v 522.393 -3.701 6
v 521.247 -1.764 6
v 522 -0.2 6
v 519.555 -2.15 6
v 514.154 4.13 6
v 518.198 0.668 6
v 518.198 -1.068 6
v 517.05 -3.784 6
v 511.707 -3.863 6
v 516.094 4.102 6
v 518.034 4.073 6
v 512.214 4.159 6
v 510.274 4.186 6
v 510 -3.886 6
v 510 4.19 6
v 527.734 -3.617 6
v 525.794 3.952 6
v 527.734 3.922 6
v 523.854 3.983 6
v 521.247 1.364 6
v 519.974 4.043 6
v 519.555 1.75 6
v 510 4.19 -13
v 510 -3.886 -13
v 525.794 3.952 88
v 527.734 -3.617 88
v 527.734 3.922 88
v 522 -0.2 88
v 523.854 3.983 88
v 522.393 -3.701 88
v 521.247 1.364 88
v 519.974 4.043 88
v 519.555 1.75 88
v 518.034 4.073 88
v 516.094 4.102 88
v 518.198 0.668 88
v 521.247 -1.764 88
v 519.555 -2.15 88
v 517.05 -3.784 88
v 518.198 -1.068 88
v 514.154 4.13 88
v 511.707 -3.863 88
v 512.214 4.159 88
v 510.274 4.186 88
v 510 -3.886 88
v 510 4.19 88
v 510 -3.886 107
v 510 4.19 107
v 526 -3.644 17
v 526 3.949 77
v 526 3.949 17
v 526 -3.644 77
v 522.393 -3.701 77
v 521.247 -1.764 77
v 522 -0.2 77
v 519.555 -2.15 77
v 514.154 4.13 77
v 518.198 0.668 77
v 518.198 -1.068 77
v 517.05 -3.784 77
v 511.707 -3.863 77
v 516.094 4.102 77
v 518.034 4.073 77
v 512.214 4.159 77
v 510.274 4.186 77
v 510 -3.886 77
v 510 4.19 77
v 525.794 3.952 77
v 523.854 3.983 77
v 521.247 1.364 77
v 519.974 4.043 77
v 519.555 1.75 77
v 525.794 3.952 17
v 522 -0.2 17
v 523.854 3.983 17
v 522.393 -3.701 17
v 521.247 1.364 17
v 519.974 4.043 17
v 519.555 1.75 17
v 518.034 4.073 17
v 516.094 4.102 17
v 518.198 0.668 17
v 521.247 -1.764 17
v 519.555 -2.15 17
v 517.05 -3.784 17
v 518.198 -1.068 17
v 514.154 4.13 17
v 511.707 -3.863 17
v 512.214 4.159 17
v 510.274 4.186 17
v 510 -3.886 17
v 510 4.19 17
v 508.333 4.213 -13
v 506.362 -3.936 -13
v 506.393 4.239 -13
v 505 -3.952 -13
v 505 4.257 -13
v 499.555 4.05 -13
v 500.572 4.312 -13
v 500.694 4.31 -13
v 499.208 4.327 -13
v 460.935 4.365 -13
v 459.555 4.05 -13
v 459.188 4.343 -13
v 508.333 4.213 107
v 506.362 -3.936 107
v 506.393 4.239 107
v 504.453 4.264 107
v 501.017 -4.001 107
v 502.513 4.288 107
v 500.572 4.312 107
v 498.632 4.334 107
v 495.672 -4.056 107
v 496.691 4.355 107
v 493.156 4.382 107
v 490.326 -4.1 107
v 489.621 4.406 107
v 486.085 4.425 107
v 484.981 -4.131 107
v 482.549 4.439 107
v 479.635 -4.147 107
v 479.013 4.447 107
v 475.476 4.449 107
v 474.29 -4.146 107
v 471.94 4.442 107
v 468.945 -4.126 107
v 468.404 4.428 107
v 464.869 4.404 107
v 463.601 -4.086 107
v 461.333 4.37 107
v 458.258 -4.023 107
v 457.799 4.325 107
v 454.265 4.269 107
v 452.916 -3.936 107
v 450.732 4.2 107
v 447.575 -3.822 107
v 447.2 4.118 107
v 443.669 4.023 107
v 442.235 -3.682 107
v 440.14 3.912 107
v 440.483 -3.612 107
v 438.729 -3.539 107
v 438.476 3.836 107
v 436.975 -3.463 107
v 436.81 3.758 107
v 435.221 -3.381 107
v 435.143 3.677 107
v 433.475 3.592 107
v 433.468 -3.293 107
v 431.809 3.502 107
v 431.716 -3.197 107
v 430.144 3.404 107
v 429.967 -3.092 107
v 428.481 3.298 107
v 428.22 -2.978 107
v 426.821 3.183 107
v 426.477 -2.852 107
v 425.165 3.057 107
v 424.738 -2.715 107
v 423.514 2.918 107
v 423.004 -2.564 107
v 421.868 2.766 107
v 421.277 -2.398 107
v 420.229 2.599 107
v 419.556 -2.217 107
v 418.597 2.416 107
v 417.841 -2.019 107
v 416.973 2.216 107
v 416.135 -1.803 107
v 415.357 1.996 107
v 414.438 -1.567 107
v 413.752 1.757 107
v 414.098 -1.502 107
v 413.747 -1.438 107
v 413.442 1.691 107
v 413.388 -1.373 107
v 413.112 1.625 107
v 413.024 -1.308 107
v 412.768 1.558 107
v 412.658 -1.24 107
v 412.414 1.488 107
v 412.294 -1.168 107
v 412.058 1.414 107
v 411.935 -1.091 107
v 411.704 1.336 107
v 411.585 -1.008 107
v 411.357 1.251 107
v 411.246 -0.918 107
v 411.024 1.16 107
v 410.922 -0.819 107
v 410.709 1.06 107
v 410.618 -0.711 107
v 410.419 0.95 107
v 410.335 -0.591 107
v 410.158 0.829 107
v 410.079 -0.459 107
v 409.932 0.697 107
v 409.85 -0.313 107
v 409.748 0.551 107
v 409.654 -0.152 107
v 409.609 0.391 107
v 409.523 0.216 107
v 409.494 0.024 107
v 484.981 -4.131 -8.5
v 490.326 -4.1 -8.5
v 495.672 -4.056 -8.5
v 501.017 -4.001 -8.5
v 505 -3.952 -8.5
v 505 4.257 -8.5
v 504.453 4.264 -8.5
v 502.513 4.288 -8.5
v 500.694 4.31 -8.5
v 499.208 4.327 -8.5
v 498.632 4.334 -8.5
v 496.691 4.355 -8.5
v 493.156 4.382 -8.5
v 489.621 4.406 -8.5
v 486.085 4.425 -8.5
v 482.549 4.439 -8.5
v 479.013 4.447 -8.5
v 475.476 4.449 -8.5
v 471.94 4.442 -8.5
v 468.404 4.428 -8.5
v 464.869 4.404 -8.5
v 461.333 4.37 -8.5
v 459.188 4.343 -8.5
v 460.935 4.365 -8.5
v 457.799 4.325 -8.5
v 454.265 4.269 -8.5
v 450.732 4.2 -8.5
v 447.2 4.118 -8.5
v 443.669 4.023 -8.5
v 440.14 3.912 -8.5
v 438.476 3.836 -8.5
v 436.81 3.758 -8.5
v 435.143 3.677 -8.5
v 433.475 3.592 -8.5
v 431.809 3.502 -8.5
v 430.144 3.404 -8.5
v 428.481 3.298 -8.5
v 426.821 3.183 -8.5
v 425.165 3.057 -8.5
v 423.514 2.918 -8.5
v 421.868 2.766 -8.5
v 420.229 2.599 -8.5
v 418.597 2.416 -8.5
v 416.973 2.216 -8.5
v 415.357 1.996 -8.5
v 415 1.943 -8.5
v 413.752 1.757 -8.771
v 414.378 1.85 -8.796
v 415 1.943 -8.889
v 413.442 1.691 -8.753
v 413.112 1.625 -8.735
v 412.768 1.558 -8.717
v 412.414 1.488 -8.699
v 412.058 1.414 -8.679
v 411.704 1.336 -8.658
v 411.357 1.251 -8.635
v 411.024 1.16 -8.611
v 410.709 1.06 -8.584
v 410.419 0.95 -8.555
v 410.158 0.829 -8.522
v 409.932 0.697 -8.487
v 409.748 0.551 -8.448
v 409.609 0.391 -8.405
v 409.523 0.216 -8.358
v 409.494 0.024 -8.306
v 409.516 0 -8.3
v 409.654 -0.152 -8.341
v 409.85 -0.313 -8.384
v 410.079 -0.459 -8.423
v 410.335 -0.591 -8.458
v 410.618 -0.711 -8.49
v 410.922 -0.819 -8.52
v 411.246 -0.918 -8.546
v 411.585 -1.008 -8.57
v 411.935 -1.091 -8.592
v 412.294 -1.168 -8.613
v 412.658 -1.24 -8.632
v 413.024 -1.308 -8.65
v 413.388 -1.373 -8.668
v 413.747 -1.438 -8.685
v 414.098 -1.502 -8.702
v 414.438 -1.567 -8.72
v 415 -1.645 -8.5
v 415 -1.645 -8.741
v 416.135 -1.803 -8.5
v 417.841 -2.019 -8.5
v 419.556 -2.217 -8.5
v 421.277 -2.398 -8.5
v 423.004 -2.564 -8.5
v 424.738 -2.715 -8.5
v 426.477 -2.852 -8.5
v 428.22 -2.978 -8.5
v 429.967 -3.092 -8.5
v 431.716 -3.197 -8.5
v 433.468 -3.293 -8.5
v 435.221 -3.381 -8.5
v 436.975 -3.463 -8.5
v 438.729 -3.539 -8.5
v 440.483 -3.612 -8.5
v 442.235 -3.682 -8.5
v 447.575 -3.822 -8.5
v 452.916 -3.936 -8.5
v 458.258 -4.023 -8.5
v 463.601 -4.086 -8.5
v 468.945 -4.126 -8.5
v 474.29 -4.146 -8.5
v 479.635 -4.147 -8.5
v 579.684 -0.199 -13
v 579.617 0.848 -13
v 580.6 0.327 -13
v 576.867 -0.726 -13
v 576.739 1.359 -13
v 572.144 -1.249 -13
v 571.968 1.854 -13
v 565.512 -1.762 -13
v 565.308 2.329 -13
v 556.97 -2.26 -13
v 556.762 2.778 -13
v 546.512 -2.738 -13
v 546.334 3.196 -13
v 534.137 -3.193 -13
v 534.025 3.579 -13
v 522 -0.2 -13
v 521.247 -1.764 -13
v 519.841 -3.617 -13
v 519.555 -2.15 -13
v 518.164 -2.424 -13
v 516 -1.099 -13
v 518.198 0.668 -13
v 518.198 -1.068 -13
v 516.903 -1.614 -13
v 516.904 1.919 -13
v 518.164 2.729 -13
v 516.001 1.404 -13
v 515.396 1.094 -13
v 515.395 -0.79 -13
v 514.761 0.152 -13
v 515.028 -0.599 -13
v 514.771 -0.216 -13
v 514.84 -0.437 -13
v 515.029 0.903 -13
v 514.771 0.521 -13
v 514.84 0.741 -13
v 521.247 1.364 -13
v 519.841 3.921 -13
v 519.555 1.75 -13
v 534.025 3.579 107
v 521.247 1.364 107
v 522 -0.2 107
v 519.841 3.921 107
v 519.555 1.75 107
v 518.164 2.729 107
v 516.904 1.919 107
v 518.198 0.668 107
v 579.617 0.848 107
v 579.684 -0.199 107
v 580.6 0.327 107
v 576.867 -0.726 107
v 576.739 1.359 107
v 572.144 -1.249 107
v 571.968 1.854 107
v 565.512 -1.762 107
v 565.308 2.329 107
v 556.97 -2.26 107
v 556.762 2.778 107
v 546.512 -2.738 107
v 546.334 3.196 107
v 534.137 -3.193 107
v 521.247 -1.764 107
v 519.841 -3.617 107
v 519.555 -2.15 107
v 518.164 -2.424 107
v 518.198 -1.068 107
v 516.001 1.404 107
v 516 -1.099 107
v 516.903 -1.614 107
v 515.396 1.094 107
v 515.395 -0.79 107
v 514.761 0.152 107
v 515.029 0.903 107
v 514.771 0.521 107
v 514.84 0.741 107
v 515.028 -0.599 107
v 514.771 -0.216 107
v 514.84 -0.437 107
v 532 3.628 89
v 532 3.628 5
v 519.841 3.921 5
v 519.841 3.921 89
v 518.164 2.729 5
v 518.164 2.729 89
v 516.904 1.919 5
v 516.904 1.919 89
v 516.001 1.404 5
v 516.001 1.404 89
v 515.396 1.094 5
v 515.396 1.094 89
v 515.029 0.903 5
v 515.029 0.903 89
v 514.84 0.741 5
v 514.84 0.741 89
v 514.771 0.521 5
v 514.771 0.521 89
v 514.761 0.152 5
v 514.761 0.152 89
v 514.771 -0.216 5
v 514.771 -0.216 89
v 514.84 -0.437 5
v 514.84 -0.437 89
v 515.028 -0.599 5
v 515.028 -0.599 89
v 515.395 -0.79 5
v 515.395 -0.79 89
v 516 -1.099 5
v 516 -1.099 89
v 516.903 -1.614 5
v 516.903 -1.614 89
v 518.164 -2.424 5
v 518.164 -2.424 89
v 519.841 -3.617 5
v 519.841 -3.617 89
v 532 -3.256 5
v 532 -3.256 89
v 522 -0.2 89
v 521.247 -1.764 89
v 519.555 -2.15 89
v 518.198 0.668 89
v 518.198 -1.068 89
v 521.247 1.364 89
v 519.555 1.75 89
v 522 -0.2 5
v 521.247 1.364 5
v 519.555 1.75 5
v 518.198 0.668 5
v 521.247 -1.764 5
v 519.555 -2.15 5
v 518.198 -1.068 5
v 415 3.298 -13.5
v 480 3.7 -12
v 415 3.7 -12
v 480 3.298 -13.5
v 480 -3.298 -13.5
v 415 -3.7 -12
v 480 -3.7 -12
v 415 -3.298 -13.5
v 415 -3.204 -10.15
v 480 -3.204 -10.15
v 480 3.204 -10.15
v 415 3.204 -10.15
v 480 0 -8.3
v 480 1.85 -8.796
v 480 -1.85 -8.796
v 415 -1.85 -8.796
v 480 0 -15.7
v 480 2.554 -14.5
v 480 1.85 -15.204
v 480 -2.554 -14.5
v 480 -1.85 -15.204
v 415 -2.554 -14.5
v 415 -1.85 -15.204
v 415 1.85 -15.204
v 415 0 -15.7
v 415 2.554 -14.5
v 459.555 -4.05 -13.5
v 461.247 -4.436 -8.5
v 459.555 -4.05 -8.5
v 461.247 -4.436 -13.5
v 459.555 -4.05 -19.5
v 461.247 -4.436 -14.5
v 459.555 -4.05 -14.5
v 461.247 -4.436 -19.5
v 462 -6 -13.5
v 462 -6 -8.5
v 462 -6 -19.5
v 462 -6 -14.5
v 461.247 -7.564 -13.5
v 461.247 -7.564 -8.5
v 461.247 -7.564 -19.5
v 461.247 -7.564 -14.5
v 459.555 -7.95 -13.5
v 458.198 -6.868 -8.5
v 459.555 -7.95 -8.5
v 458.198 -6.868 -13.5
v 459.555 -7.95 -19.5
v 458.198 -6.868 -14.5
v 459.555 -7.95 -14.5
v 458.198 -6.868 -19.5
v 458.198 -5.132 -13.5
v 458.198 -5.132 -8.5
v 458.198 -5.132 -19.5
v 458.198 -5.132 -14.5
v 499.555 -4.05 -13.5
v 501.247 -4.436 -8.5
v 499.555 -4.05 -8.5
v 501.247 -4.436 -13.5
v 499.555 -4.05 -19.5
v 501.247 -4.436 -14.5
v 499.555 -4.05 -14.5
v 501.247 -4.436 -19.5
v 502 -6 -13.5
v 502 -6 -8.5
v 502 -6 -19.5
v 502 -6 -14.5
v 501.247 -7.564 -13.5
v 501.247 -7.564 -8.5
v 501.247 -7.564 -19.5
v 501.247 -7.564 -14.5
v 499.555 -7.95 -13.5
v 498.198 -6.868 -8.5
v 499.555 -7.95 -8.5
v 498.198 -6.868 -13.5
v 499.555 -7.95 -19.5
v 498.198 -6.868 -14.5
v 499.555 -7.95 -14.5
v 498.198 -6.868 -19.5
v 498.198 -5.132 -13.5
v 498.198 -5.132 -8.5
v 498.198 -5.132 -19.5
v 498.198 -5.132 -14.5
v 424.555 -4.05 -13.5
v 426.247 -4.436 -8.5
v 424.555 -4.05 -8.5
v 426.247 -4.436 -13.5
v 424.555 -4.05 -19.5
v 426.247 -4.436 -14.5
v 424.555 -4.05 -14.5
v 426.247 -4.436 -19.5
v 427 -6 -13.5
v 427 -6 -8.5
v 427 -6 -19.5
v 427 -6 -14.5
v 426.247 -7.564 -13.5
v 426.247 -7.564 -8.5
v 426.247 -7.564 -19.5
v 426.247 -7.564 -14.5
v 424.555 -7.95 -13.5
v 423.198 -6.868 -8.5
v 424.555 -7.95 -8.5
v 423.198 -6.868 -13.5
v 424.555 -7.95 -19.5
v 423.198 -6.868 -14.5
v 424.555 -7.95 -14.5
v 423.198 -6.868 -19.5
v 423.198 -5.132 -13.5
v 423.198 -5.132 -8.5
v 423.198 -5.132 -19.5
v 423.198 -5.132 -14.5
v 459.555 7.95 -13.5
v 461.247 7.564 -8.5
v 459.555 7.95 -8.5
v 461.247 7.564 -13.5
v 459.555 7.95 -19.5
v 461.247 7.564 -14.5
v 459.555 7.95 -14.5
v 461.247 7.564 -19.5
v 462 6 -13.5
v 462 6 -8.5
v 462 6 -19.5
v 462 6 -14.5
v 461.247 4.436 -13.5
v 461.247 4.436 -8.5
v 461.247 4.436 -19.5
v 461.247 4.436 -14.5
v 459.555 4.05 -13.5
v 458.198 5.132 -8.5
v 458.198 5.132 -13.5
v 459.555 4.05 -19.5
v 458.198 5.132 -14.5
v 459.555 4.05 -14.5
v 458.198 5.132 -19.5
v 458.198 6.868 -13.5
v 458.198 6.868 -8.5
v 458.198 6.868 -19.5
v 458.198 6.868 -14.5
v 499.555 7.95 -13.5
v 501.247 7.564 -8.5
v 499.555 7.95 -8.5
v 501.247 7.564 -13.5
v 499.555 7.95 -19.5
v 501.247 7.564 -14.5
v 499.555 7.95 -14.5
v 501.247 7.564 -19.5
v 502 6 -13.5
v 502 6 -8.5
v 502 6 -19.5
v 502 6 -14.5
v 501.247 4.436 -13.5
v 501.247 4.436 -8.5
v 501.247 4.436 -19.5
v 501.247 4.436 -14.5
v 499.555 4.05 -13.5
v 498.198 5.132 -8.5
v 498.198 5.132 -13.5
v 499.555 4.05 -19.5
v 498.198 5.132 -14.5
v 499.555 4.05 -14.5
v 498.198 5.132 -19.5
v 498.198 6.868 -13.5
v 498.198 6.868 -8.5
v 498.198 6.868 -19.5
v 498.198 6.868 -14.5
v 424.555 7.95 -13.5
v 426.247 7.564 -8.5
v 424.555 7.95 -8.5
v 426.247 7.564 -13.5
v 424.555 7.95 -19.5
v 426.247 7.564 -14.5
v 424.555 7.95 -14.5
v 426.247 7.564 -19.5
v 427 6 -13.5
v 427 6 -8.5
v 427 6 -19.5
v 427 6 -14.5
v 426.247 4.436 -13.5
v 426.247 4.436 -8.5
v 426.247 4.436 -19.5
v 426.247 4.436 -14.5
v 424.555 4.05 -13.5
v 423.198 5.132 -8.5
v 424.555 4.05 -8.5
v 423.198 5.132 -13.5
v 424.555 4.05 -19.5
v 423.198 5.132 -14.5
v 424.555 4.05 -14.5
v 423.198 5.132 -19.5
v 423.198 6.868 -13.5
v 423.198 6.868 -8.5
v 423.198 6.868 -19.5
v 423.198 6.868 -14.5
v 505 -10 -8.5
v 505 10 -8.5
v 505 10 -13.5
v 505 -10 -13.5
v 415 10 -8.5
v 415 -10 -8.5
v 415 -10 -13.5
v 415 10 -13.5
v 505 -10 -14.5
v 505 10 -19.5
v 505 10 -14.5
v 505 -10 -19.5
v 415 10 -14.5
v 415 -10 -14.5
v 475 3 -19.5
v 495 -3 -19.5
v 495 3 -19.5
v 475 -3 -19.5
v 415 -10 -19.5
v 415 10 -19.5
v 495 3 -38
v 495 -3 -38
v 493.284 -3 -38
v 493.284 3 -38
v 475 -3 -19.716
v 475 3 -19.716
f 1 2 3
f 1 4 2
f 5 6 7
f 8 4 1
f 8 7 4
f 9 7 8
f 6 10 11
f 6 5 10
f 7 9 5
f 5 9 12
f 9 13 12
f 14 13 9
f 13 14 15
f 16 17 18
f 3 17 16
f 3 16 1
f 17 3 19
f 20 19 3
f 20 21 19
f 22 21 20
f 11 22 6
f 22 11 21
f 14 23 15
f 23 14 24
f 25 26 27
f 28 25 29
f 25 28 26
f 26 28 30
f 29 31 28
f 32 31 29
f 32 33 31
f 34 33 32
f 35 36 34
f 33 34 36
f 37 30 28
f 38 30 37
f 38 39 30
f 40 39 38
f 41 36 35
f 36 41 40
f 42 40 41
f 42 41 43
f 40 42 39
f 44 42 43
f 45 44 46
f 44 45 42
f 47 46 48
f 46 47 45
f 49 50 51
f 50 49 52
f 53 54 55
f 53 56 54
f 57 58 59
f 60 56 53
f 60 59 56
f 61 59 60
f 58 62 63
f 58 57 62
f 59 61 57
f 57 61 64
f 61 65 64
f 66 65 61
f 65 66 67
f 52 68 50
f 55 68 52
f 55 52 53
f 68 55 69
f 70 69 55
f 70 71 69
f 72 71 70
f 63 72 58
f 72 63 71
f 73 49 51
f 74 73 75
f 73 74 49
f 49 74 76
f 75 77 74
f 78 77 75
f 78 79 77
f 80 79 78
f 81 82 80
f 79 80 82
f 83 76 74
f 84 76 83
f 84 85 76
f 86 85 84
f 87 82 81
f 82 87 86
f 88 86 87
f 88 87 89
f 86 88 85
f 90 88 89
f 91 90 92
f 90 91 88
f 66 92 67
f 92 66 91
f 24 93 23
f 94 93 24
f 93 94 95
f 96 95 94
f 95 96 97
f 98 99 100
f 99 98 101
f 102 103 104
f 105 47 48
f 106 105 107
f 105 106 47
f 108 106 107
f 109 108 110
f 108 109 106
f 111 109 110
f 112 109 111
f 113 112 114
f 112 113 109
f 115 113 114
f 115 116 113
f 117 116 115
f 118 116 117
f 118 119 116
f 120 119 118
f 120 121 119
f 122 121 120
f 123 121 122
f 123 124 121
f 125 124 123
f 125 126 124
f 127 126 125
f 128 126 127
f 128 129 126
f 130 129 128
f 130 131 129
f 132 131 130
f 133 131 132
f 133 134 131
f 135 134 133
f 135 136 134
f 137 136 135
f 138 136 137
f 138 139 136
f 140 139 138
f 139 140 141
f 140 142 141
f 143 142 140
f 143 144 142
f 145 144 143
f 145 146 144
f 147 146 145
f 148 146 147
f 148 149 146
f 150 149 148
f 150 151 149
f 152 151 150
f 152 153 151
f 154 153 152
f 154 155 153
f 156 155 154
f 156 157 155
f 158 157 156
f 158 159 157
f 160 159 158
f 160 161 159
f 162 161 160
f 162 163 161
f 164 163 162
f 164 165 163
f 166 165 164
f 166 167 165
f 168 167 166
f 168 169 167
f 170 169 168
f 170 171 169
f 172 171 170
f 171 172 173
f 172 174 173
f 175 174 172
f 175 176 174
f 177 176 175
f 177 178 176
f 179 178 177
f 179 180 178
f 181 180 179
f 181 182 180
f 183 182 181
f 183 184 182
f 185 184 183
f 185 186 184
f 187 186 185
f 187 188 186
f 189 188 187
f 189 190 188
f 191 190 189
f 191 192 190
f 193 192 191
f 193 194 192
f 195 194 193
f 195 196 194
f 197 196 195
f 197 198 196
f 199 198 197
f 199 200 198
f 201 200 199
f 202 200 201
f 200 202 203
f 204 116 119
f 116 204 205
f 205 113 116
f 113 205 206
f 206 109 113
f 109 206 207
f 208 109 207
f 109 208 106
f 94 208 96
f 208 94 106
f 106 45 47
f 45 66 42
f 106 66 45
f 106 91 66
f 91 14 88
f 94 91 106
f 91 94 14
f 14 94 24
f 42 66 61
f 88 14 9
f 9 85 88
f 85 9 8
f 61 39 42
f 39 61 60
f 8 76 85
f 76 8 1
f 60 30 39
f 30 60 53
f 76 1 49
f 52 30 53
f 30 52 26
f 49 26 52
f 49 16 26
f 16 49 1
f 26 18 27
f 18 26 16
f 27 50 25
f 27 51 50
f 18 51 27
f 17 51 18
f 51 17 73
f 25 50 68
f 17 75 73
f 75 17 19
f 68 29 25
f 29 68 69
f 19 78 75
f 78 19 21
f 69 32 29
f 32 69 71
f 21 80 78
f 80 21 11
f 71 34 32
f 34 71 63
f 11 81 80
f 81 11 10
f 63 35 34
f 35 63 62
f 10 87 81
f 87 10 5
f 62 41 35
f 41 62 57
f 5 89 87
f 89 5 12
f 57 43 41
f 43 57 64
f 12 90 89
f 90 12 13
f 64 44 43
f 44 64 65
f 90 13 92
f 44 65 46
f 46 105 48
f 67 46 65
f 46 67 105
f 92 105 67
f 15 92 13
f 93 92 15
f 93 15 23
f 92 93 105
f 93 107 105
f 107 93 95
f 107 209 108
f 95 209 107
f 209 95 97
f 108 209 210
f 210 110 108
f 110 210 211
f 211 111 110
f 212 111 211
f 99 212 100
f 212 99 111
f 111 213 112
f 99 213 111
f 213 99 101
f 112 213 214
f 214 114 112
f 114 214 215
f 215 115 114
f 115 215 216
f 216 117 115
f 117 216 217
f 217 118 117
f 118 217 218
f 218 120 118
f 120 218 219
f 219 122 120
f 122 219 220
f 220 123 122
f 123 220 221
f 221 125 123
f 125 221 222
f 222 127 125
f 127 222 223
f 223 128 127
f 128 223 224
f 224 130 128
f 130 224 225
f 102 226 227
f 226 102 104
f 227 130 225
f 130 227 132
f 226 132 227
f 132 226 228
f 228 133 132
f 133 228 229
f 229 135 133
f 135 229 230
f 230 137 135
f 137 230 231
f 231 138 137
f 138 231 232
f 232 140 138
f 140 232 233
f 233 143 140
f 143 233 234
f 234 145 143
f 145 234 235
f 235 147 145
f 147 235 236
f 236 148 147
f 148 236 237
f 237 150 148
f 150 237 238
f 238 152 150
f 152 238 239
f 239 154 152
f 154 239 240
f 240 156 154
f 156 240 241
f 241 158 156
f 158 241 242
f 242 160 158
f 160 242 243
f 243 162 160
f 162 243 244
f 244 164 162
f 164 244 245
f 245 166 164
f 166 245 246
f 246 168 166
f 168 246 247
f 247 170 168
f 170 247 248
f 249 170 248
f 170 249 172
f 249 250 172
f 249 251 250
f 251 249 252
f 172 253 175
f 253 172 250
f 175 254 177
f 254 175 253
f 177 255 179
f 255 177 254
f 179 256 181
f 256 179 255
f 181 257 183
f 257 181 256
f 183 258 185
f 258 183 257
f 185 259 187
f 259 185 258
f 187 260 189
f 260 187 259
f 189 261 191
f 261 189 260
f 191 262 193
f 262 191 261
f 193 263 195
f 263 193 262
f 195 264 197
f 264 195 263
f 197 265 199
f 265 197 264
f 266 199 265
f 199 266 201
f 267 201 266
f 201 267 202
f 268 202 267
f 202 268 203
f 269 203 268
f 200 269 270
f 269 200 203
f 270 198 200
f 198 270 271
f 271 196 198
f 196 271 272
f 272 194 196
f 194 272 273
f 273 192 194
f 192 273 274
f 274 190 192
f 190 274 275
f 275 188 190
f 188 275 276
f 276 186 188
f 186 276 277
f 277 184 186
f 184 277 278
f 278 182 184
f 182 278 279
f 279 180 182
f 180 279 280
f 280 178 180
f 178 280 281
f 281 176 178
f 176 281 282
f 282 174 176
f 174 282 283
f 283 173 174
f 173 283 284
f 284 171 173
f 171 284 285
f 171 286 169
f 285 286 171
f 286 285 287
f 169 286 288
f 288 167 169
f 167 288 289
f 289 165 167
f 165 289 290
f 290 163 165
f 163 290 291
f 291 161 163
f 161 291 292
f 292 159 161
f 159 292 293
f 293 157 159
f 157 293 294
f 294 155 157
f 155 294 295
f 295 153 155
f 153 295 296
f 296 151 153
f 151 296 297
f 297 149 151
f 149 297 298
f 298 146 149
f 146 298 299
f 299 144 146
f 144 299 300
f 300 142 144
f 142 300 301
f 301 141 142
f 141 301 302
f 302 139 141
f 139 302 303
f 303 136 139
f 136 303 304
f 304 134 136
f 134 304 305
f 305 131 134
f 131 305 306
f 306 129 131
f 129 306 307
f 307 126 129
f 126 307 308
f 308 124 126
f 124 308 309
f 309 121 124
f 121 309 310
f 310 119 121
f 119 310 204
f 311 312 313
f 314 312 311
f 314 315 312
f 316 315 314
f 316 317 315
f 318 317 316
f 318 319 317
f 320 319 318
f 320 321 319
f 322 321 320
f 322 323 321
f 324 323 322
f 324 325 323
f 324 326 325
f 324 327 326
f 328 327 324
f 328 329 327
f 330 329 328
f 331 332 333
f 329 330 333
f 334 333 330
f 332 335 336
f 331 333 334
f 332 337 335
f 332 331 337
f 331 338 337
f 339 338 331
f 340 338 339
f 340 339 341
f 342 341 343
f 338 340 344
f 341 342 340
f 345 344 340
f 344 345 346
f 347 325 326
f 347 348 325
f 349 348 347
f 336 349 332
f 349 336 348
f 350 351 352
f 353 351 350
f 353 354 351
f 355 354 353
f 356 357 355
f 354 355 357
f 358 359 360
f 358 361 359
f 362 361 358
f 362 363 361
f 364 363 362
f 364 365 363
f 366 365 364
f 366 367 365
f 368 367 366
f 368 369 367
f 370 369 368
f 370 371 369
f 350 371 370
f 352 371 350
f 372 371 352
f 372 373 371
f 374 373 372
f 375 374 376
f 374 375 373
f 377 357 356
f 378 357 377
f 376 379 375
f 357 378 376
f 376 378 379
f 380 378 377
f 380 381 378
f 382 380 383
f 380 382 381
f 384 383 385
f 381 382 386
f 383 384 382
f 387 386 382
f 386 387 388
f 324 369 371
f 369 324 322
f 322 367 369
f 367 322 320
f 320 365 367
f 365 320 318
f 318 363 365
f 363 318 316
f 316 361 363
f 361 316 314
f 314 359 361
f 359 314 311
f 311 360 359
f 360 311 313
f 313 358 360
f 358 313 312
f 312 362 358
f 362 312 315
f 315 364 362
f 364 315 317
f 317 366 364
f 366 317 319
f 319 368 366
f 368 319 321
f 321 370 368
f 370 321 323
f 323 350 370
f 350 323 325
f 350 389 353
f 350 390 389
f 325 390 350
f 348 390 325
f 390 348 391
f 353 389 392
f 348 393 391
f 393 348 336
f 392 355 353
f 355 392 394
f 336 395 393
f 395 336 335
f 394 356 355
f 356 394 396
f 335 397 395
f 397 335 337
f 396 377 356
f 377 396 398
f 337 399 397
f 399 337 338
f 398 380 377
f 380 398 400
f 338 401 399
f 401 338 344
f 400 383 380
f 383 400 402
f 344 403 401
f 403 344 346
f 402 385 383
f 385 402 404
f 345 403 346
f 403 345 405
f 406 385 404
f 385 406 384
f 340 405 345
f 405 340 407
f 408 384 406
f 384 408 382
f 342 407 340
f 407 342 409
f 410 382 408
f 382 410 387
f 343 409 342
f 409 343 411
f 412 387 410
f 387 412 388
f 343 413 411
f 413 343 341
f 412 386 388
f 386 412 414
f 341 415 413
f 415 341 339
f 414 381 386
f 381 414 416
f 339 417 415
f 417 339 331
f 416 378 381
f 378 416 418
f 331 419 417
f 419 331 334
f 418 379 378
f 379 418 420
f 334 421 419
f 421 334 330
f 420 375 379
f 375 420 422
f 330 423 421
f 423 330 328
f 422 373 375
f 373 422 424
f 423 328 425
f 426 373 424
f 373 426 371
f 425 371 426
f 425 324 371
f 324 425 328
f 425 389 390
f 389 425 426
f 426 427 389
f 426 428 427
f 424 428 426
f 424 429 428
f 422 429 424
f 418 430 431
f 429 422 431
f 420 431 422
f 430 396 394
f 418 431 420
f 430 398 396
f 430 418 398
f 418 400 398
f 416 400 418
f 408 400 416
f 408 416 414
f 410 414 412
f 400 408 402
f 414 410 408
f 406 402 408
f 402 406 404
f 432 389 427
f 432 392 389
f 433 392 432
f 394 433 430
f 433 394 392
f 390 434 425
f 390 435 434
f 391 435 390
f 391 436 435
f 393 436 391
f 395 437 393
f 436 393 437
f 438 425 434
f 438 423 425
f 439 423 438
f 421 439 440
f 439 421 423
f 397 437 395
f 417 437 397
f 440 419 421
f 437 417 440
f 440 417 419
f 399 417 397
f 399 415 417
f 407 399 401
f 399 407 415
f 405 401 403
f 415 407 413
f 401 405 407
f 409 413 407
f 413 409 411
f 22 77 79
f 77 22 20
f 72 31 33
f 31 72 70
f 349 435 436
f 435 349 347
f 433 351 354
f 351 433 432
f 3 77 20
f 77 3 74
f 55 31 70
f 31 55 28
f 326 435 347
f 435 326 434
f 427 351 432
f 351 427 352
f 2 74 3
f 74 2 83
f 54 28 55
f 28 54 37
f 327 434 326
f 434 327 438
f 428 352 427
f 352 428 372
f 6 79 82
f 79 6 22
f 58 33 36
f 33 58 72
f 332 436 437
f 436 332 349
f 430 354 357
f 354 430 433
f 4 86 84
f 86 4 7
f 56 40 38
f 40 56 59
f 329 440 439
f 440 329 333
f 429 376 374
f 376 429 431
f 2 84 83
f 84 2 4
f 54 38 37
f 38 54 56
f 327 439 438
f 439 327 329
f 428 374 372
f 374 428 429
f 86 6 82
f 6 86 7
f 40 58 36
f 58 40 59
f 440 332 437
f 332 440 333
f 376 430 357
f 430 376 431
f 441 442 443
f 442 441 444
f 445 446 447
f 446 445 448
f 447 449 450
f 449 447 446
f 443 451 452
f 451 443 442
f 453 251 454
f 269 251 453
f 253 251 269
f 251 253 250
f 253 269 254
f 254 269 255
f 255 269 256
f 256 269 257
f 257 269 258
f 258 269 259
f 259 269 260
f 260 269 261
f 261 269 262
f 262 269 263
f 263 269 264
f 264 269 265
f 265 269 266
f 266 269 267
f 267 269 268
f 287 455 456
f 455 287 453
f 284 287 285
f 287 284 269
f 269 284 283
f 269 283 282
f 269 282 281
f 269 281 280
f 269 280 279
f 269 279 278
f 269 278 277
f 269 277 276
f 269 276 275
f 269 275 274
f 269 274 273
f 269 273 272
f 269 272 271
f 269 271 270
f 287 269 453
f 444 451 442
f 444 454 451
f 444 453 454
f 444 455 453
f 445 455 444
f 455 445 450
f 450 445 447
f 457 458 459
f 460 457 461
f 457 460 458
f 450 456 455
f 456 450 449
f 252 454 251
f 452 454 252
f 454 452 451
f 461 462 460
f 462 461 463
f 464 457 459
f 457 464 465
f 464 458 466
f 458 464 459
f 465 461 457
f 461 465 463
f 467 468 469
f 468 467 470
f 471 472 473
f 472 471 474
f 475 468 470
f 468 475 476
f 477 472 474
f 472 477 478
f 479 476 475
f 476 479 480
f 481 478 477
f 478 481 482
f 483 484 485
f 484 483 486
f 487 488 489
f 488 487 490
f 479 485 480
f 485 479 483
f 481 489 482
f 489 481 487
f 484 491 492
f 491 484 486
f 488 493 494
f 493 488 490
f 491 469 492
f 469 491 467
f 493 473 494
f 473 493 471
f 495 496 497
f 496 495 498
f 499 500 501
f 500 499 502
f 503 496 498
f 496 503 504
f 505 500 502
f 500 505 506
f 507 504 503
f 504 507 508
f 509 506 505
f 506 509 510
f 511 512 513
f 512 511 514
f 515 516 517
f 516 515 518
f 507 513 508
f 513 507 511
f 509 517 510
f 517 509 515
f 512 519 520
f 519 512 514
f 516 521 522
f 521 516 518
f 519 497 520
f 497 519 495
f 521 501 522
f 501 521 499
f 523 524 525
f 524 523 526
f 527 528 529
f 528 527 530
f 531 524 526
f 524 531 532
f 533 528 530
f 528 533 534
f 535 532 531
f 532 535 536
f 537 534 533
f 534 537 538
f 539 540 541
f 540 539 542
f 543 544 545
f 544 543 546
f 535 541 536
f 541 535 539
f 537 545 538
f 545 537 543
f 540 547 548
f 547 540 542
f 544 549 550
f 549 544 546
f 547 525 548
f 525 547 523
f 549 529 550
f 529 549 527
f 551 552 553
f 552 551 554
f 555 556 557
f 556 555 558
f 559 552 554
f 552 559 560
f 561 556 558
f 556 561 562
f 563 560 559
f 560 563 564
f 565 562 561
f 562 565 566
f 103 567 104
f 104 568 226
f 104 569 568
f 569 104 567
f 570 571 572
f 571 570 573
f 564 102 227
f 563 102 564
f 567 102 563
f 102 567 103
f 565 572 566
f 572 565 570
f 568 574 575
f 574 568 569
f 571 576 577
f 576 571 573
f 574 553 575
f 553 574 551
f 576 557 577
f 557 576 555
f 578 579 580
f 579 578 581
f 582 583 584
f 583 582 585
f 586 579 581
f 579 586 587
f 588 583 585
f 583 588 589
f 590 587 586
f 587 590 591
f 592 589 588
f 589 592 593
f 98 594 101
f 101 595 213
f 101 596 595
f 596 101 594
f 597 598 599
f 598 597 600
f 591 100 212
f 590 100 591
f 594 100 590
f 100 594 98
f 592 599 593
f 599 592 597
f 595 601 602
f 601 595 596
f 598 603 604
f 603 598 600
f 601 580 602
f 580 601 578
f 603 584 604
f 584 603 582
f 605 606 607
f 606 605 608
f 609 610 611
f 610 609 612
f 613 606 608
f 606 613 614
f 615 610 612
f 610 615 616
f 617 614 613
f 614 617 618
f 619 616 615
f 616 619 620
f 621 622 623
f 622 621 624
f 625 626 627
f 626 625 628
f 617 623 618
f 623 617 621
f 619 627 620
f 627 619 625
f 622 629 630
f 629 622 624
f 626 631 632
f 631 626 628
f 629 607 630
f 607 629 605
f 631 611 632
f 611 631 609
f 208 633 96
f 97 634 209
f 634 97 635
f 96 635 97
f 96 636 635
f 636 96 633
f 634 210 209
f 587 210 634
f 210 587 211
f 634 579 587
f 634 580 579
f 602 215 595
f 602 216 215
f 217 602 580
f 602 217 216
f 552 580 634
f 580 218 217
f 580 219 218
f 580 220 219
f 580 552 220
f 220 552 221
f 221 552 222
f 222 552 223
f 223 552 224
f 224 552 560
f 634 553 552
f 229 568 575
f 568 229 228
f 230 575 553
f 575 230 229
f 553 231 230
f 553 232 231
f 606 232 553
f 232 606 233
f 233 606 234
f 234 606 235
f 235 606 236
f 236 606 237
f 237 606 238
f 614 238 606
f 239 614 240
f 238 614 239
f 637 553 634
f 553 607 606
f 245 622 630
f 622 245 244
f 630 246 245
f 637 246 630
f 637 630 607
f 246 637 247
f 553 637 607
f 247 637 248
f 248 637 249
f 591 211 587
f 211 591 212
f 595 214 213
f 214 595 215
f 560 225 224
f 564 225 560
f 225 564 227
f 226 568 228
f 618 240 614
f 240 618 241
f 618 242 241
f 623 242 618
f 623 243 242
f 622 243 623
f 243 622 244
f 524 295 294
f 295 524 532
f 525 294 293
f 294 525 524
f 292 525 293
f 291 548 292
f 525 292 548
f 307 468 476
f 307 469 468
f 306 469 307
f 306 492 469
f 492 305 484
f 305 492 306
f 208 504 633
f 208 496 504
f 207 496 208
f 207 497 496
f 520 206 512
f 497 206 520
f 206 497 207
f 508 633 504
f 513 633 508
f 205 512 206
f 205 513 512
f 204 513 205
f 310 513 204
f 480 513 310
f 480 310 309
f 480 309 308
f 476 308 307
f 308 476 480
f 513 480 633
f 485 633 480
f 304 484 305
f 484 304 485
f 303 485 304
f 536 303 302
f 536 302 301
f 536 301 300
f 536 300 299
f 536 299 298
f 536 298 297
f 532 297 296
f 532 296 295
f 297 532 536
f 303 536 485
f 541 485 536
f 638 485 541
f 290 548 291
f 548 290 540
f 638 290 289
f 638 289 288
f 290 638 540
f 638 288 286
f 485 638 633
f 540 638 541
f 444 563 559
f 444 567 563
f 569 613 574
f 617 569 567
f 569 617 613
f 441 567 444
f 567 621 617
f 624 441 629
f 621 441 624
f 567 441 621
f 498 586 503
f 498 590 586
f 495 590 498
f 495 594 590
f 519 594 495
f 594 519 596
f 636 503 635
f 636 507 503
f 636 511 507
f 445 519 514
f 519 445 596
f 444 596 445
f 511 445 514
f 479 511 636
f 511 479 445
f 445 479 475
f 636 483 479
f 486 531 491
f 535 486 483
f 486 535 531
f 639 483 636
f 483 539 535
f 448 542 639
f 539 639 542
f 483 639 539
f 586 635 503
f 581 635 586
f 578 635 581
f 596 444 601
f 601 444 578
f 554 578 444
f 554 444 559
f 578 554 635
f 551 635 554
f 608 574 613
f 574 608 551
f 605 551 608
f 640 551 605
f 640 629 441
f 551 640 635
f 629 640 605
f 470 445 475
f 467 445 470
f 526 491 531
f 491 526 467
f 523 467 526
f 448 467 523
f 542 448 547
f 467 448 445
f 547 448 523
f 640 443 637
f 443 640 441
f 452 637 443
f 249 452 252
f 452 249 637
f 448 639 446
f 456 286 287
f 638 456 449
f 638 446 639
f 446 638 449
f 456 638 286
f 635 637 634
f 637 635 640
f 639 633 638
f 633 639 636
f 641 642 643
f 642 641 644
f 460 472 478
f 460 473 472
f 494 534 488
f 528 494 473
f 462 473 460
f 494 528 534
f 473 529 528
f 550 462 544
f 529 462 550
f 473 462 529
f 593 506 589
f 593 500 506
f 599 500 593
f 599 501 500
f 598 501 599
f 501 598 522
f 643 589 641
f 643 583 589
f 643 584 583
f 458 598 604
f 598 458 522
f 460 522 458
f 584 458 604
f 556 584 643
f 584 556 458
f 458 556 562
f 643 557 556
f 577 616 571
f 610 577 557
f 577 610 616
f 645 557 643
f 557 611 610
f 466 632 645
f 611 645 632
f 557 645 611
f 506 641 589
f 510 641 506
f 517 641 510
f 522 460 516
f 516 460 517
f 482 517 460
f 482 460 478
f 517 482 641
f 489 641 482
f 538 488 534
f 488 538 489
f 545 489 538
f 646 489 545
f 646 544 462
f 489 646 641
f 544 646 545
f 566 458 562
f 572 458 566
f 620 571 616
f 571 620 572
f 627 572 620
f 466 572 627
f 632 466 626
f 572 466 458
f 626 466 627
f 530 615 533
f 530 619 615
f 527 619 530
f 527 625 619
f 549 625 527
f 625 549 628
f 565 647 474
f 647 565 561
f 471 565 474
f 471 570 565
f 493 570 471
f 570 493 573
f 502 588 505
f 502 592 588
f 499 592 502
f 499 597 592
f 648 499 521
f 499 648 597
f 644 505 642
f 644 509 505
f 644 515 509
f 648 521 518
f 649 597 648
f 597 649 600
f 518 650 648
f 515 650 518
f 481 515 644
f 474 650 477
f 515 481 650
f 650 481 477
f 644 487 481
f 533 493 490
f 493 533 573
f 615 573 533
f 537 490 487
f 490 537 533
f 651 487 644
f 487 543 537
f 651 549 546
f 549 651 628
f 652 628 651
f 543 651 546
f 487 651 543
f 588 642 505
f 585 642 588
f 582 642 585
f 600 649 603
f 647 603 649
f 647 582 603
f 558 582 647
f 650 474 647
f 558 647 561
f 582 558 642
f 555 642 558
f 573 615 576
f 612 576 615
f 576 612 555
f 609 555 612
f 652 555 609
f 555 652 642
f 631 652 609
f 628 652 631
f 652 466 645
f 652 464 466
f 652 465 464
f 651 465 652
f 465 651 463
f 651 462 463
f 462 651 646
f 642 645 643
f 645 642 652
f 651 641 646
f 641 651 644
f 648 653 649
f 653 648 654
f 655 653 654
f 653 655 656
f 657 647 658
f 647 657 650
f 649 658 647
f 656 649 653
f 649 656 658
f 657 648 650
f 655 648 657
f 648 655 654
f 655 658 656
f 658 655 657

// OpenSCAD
module tail_front(){
  difference(){
  scale([0.6,0.3,0.6])
  linear_extrude(file = "tail/front.dxf",height = 200, convexity = 10);

  union(){
    translate([110,60,-1])
    cube([36,70,20]);
    translate([110,60,101])
    cube([36,70,20]);
    translate([110,60,30])
    cube([16,70,60]);

  }
}

}

module tail_back(){

  difference(){
  scale([0.6,0.3,0.6])
  scale([0.6,1,1])
  translate([120,0,0])
  linear_extrude(file = "tail/back.dxf",height = 200, convexity = 10);
  union(){
    translate([110,60,18])
    cube([22,70,120-36]);
  }
}
}

module tail_rod(){
      translate([110, 0, -12])rotate([0,90,0])cylinder(r=3.7,h=370);
}

module tail_unstranlated(){
difference(){
union(){
  tail_front();
  tail_back();
}
    translate([120,65,-1])
cylinder(r=2,h=200);

}
}

module tail(){
  translate([400,-65.2,-13]) tail_unstranlated();
}

module tail_socket(){
  difference(){
    translate([460,0,-11]) cube([90,20,5],center=true);
    union(){
      tail_rod();
      translate([460,-6,-30]) cylinder(r=2,h=400);
     translate([500,-6,-30]) cylinder(r=2,h=400);
     translate([425,-6,-30]) cylinder(r=2,h=400);
     translate([460,6,-30]) cylinder(r=2,h=400);
     translate([500,6,-30]) cylinder(r=2,h=400);
     translate([425,6,-30]) cylinder(r=2,h=400);
    }
  }
}

module tail_socket_bottom(){
  difference(){
    translate([460,0,-17]) cube([90,20,5],center=true);
    union(){
      tail_rod();
      translate([460,-6,-30]) cylinder(r=2,h=400);
     translate([500,-6,-30]) cylinder(r=2,h=400);
     translate([425,-6,-30]) cylinder(r=2,h=400);
     translate([460,6,-30]) cylinder(r=2,h=400);
     translate([500,6,-30]) cylinder(r=2,h=400);
     translate([425,6,-30]) cylinder(r=2,h=400);

    }
  }
}

module back_wheel(){
difference(){
 translate([485,0,-28]) cube([20,6,20],center=true);
 translate([485-10,-6+12,-28-20]) rotate([0,45,0]) cube([40,40,40],center=true);
}
}

difference(){
tail();
    tail_rod();
}
//tail_rod();
tail_socket();
tail_socket_bottom();

back_wheel();
